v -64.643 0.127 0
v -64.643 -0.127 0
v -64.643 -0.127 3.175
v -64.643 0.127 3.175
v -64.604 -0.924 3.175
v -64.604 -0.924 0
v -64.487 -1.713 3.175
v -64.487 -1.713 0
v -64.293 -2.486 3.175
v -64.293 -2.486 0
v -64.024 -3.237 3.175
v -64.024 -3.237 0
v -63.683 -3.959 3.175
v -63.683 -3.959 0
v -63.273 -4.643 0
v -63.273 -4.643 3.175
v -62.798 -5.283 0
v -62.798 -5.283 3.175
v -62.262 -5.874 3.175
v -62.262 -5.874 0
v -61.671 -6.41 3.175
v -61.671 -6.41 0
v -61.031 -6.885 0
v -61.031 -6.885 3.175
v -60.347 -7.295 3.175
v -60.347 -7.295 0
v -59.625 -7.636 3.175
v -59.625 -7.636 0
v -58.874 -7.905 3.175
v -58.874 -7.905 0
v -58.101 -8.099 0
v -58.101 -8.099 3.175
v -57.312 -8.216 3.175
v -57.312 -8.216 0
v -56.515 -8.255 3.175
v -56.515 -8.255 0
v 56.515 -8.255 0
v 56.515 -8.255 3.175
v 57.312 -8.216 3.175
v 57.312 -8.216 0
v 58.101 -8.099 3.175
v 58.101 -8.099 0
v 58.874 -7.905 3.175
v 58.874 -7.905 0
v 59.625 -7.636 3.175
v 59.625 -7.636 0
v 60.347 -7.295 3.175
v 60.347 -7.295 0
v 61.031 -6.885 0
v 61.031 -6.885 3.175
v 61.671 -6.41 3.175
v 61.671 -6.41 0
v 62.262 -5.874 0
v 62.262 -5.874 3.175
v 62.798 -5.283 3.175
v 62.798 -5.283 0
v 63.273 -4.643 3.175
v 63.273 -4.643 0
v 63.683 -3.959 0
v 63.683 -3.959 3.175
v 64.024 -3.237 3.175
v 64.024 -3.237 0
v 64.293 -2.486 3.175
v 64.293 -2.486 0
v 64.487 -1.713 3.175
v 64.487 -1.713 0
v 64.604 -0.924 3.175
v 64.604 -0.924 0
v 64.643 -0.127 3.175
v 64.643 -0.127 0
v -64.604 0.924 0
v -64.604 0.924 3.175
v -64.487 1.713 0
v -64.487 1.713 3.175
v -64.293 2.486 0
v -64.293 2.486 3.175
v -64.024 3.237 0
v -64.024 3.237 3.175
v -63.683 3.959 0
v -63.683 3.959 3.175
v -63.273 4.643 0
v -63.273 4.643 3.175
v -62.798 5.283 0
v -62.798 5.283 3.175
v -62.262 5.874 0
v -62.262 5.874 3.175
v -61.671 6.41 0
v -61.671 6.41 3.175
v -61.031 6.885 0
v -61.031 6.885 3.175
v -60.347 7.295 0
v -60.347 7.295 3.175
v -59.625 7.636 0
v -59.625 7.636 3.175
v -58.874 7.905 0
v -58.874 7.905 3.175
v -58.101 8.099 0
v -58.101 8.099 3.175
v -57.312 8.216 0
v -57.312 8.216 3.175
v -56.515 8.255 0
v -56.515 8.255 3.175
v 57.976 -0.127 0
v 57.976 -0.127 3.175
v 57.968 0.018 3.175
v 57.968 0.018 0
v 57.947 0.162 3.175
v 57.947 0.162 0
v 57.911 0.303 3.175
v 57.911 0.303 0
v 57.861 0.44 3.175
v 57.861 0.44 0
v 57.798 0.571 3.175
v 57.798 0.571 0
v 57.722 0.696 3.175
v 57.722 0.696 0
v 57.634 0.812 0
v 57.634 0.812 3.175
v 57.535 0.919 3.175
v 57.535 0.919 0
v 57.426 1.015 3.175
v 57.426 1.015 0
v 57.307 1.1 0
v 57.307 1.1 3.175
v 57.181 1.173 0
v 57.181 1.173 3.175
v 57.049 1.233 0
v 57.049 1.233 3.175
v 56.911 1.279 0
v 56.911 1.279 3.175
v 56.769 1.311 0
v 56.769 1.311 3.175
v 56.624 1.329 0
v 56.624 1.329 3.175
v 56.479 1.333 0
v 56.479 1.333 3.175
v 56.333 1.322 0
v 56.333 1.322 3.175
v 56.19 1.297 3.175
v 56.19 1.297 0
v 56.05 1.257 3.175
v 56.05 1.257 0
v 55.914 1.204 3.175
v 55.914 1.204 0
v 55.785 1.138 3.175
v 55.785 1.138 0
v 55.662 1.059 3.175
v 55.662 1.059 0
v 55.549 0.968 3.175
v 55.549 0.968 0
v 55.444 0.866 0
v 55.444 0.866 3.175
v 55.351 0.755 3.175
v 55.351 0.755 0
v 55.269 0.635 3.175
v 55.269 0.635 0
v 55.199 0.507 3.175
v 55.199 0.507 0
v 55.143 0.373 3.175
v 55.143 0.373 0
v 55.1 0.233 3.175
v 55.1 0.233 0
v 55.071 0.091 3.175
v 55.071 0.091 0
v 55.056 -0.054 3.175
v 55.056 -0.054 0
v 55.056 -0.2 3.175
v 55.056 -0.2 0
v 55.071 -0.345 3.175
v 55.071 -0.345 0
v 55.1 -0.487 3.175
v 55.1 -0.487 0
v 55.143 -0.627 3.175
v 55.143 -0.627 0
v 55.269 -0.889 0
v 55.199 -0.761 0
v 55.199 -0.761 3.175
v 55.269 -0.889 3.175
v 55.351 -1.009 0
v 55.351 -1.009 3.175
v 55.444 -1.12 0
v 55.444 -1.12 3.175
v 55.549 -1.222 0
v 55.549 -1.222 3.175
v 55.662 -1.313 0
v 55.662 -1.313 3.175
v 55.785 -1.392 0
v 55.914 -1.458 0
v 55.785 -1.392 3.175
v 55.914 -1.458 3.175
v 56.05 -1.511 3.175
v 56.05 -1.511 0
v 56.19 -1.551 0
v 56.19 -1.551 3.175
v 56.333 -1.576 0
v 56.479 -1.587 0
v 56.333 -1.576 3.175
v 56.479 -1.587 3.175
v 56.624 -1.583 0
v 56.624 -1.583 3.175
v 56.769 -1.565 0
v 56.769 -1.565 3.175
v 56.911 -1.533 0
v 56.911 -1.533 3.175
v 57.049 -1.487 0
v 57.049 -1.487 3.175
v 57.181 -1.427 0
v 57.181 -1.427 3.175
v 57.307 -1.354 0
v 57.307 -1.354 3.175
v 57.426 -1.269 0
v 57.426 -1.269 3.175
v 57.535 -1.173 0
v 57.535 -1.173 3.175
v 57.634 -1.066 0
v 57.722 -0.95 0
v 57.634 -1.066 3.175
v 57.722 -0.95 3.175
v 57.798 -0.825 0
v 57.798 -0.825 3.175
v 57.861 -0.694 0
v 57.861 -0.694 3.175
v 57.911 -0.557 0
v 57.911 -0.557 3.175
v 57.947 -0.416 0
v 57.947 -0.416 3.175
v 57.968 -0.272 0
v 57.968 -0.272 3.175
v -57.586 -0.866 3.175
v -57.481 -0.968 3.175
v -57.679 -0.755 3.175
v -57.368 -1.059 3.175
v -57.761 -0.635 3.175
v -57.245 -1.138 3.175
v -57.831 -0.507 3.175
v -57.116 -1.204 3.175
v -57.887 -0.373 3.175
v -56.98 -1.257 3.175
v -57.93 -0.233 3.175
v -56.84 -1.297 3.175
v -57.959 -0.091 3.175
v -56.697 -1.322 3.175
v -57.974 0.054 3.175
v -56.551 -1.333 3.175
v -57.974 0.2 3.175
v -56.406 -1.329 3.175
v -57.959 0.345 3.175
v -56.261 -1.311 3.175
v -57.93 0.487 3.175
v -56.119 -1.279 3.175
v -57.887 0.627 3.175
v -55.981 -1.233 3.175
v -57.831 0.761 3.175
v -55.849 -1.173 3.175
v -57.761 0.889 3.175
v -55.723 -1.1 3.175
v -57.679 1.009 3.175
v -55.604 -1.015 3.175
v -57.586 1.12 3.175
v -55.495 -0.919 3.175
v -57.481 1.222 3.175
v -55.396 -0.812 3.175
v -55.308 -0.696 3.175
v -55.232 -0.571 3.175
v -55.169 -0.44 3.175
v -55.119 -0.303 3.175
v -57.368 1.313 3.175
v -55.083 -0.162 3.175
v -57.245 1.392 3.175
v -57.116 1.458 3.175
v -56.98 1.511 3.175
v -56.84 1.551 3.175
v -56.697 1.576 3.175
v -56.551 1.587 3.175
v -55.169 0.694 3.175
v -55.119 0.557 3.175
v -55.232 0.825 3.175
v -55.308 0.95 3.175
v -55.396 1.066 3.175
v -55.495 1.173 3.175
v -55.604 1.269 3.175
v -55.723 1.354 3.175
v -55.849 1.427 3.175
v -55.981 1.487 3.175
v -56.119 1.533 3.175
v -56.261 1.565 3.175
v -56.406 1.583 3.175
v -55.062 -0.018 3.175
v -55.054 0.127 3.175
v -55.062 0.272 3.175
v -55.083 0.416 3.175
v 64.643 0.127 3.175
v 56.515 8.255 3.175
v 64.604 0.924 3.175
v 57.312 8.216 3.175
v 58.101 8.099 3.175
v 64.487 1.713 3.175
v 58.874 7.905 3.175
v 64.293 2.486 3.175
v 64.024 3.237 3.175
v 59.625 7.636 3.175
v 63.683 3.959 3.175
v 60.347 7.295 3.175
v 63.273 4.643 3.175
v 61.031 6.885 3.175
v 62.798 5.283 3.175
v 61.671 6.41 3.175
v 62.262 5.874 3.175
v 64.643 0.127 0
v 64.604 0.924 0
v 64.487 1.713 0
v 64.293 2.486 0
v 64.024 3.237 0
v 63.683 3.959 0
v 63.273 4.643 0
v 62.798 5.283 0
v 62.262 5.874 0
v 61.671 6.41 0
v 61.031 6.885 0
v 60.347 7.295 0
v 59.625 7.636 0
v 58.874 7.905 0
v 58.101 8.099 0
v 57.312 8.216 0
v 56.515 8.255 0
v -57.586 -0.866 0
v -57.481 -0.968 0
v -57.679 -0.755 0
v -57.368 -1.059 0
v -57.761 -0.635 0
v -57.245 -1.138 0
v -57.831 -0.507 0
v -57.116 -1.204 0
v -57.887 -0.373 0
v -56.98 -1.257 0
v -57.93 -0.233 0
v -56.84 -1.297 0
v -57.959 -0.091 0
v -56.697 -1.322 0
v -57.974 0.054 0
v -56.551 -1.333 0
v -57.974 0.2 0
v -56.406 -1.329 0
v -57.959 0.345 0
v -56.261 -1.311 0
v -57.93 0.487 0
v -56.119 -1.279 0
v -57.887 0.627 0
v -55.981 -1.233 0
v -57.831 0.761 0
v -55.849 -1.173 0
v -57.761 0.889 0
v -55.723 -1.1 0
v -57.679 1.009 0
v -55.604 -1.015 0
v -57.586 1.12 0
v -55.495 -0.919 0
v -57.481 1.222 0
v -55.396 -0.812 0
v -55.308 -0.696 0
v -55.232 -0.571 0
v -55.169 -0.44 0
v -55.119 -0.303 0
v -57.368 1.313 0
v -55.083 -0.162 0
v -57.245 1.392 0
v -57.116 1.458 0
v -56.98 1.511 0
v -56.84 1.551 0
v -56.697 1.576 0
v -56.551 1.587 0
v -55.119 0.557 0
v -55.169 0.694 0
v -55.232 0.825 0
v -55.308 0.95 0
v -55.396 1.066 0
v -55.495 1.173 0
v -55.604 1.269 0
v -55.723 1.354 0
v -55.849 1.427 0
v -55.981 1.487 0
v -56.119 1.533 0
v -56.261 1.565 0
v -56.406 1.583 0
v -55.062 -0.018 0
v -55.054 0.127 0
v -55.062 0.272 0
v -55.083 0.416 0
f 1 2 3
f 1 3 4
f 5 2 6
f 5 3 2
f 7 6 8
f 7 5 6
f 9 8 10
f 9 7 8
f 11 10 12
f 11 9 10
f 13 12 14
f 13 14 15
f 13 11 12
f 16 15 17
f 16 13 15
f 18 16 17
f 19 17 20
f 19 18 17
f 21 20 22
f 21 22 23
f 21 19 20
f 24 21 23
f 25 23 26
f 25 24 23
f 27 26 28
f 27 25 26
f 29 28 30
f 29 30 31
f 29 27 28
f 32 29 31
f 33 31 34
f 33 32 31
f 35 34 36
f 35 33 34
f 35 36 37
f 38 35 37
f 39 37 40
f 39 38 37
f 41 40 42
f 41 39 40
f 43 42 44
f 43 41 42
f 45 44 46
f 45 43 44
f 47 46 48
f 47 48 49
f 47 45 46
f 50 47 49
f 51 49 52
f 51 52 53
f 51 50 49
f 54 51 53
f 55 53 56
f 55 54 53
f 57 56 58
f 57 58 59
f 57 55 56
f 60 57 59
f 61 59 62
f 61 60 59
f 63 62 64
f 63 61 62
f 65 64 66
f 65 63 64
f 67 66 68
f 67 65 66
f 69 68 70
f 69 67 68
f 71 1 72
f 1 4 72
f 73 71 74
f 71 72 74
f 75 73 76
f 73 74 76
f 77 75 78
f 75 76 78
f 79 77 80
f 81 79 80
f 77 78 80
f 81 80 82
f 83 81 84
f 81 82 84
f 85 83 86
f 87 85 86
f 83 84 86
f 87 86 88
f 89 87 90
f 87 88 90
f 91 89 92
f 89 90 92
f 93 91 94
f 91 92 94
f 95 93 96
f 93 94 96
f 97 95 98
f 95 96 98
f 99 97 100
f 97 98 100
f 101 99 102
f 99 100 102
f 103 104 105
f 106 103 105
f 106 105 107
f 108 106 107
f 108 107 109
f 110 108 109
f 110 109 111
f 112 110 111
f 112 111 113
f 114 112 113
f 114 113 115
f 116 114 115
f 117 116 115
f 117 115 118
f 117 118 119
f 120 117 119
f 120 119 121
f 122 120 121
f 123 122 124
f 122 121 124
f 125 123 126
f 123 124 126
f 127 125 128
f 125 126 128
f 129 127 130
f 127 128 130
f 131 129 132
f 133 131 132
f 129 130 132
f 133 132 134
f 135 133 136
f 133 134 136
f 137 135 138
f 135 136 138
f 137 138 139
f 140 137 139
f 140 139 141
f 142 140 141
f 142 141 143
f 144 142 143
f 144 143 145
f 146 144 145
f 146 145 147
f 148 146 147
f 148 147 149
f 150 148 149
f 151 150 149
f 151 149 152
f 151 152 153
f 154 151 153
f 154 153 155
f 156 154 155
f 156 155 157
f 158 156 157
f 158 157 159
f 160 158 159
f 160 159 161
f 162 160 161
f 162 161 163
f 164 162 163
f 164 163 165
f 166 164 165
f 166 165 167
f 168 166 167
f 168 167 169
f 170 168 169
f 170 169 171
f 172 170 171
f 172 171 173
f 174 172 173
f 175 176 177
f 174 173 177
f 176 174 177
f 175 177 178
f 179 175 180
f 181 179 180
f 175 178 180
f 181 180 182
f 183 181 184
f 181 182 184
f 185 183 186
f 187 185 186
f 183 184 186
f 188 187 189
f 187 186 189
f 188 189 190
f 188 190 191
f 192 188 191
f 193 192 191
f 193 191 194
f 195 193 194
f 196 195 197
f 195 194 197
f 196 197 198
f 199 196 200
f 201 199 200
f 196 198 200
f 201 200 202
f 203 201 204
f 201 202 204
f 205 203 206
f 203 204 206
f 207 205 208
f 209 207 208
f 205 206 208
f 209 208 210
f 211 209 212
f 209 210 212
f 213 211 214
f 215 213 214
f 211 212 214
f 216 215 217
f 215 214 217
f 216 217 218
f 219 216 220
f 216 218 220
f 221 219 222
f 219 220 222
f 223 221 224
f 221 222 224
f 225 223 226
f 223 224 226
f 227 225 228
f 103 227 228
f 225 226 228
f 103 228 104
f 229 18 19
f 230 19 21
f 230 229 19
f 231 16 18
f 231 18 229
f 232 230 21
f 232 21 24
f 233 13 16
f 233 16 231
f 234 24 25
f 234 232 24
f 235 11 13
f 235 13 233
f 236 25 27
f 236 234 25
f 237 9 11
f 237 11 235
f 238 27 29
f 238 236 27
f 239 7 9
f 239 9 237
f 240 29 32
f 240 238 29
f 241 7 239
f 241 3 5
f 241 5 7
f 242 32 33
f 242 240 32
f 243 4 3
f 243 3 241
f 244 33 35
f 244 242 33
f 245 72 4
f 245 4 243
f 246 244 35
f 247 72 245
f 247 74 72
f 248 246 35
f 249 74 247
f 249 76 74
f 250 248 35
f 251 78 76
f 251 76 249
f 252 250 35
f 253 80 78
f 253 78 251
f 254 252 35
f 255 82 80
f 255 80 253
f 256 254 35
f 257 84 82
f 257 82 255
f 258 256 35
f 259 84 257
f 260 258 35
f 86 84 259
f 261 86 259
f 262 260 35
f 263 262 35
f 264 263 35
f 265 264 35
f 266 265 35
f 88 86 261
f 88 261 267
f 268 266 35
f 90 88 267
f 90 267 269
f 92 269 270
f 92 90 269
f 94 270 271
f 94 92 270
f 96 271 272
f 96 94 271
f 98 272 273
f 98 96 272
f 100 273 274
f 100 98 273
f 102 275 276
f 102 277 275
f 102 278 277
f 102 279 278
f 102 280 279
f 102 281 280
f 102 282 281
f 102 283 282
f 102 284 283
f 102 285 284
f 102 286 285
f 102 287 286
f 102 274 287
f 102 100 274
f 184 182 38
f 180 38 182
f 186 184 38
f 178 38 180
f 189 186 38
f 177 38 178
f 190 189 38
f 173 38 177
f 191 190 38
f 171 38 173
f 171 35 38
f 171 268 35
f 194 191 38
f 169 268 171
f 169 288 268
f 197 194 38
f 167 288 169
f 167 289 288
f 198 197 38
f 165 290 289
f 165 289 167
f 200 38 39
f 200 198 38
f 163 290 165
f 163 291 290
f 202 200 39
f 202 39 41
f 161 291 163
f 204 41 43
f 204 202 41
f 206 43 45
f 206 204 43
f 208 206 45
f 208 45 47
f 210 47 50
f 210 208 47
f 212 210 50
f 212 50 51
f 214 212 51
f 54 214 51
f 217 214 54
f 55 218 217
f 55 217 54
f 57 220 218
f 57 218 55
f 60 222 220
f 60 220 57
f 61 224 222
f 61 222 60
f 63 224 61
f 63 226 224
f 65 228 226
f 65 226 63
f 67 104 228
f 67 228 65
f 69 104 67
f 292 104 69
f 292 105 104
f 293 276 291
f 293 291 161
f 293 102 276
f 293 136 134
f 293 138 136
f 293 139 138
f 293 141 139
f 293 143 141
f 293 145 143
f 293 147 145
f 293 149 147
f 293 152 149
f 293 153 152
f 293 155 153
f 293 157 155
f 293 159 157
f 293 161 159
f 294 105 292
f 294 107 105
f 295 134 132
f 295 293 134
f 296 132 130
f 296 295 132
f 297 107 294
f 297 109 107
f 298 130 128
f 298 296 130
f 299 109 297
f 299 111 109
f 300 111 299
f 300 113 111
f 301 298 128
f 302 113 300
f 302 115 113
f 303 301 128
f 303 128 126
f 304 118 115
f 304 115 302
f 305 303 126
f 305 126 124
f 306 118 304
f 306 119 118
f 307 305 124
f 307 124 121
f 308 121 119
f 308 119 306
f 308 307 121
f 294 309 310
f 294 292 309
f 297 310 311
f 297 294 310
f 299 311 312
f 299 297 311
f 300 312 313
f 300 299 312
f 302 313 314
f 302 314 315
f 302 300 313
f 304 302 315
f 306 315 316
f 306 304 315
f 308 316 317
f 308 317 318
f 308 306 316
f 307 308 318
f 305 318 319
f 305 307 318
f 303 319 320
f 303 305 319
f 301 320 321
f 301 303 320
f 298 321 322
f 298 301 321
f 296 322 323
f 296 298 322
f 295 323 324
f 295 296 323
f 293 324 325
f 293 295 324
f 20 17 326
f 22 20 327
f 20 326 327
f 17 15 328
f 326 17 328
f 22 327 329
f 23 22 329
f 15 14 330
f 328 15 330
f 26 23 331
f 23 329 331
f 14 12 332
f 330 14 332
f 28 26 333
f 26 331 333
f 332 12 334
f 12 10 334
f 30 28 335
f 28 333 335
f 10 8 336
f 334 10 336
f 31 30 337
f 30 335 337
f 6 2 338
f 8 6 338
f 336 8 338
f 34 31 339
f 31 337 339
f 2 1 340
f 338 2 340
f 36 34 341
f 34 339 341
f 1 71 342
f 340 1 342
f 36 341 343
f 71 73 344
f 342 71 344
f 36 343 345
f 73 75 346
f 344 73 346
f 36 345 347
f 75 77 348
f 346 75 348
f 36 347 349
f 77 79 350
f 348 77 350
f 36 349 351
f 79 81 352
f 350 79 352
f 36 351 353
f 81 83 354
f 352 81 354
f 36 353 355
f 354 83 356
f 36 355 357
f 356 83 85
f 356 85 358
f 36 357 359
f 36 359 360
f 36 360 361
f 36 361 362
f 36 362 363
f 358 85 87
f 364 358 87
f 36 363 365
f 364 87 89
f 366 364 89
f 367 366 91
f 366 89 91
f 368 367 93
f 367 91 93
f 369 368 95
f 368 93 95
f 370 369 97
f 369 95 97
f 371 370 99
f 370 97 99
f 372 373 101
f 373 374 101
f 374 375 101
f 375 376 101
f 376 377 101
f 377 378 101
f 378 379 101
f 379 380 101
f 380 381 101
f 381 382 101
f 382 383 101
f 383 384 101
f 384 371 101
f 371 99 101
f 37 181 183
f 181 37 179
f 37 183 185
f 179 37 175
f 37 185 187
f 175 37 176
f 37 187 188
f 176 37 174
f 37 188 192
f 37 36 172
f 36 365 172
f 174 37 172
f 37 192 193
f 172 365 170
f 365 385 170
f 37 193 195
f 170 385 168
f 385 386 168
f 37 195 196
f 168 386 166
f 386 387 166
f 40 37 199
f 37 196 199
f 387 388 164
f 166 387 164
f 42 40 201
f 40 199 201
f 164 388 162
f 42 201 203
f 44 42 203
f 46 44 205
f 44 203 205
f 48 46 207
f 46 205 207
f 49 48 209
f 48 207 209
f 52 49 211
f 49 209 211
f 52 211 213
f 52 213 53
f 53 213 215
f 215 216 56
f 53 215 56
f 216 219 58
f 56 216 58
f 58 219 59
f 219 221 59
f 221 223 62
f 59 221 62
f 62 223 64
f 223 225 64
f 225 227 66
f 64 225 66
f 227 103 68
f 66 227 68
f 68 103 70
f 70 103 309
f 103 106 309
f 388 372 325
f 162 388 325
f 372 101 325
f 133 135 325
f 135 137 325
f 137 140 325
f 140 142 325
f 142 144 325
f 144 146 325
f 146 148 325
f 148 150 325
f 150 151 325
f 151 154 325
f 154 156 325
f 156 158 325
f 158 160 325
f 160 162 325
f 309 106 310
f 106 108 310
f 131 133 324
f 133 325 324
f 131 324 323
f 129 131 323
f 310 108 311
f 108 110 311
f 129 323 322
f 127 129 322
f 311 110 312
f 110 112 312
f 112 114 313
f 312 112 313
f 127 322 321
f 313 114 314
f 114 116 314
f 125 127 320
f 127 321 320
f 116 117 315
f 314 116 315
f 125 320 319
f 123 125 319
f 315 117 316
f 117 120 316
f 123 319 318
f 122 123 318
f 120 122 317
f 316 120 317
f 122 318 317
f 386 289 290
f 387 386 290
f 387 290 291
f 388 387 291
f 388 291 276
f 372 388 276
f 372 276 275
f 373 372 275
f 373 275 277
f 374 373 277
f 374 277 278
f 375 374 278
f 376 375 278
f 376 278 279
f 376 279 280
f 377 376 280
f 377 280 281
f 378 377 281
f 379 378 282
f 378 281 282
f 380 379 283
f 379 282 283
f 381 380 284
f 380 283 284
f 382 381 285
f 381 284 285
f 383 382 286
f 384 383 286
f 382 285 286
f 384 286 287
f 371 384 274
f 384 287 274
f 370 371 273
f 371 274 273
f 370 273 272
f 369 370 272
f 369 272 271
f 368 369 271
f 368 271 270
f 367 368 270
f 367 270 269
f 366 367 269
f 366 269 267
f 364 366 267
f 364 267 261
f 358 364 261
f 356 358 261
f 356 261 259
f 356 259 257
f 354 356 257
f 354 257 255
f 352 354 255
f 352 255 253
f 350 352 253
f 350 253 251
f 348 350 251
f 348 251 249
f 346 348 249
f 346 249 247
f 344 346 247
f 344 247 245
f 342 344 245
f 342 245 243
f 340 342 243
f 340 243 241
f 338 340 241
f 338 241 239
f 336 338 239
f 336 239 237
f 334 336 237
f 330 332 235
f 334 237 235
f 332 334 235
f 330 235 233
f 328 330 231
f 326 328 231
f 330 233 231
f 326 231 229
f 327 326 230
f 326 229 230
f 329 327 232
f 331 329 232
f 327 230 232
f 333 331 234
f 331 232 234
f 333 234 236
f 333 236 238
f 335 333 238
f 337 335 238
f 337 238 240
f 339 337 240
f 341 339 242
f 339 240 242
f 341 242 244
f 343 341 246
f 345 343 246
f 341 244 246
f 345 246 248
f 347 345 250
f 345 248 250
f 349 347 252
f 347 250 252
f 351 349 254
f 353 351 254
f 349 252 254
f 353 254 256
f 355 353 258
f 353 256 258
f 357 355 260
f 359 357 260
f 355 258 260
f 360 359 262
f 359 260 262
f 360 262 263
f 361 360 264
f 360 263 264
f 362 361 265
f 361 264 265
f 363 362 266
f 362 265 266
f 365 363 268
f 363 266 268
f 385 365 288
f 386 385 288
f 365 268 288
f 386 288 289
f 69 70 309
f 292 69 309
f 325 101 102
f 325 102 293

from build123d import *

# Parameters (mm, degrees)
SKETCH1_W           = 129.286
SKETCH1_H           = 16.51
BOSS_EXTRUDE1_DEPTH = 3.175
FILLET1_R           = 8.128
SKETCH2_R           = 1.4605
CUT_EXTRUDE1_DEPTH  = 66.24525346


with BuildPart() as part:
    # Sketch1 → Boss-Extrude1 (new body)
    with BuildSketch(Plane.XY):
        Rectangle(SKETCH1_W, SKETCH1_H)
    extrude(amount=BOSS_EXTRUDE1_DEPTH)

    # Fillet1
    fillet1_edges = [part.edges().sort_by_distance(p)[0] for p in [
        (64.643, -8.255, 1.5875),
        (-64.643, -8.255, 1.5875),
        (-64.643, 8.255, 1.5875),
        (64.643, 8.255, 1.5875),
    ]]
    fillet(fillet1_edges, radius=FILLET1_R)

    # Sketch2 → Cut-Extrude1 (cut, through all)
    with BuildSketch(Plane.XY.offset(3.175)):
        with Locations((-56.515, 0.127)):
            Circle(SKETCH2_R)
        with Locations((56.515, -0.127)):
            Circle(SKETCH2_R)
    extrude(amount=-CUT_EXTRUDE1_DEPTH, mode=Mode.SUBTRACT)


solid = part.part
